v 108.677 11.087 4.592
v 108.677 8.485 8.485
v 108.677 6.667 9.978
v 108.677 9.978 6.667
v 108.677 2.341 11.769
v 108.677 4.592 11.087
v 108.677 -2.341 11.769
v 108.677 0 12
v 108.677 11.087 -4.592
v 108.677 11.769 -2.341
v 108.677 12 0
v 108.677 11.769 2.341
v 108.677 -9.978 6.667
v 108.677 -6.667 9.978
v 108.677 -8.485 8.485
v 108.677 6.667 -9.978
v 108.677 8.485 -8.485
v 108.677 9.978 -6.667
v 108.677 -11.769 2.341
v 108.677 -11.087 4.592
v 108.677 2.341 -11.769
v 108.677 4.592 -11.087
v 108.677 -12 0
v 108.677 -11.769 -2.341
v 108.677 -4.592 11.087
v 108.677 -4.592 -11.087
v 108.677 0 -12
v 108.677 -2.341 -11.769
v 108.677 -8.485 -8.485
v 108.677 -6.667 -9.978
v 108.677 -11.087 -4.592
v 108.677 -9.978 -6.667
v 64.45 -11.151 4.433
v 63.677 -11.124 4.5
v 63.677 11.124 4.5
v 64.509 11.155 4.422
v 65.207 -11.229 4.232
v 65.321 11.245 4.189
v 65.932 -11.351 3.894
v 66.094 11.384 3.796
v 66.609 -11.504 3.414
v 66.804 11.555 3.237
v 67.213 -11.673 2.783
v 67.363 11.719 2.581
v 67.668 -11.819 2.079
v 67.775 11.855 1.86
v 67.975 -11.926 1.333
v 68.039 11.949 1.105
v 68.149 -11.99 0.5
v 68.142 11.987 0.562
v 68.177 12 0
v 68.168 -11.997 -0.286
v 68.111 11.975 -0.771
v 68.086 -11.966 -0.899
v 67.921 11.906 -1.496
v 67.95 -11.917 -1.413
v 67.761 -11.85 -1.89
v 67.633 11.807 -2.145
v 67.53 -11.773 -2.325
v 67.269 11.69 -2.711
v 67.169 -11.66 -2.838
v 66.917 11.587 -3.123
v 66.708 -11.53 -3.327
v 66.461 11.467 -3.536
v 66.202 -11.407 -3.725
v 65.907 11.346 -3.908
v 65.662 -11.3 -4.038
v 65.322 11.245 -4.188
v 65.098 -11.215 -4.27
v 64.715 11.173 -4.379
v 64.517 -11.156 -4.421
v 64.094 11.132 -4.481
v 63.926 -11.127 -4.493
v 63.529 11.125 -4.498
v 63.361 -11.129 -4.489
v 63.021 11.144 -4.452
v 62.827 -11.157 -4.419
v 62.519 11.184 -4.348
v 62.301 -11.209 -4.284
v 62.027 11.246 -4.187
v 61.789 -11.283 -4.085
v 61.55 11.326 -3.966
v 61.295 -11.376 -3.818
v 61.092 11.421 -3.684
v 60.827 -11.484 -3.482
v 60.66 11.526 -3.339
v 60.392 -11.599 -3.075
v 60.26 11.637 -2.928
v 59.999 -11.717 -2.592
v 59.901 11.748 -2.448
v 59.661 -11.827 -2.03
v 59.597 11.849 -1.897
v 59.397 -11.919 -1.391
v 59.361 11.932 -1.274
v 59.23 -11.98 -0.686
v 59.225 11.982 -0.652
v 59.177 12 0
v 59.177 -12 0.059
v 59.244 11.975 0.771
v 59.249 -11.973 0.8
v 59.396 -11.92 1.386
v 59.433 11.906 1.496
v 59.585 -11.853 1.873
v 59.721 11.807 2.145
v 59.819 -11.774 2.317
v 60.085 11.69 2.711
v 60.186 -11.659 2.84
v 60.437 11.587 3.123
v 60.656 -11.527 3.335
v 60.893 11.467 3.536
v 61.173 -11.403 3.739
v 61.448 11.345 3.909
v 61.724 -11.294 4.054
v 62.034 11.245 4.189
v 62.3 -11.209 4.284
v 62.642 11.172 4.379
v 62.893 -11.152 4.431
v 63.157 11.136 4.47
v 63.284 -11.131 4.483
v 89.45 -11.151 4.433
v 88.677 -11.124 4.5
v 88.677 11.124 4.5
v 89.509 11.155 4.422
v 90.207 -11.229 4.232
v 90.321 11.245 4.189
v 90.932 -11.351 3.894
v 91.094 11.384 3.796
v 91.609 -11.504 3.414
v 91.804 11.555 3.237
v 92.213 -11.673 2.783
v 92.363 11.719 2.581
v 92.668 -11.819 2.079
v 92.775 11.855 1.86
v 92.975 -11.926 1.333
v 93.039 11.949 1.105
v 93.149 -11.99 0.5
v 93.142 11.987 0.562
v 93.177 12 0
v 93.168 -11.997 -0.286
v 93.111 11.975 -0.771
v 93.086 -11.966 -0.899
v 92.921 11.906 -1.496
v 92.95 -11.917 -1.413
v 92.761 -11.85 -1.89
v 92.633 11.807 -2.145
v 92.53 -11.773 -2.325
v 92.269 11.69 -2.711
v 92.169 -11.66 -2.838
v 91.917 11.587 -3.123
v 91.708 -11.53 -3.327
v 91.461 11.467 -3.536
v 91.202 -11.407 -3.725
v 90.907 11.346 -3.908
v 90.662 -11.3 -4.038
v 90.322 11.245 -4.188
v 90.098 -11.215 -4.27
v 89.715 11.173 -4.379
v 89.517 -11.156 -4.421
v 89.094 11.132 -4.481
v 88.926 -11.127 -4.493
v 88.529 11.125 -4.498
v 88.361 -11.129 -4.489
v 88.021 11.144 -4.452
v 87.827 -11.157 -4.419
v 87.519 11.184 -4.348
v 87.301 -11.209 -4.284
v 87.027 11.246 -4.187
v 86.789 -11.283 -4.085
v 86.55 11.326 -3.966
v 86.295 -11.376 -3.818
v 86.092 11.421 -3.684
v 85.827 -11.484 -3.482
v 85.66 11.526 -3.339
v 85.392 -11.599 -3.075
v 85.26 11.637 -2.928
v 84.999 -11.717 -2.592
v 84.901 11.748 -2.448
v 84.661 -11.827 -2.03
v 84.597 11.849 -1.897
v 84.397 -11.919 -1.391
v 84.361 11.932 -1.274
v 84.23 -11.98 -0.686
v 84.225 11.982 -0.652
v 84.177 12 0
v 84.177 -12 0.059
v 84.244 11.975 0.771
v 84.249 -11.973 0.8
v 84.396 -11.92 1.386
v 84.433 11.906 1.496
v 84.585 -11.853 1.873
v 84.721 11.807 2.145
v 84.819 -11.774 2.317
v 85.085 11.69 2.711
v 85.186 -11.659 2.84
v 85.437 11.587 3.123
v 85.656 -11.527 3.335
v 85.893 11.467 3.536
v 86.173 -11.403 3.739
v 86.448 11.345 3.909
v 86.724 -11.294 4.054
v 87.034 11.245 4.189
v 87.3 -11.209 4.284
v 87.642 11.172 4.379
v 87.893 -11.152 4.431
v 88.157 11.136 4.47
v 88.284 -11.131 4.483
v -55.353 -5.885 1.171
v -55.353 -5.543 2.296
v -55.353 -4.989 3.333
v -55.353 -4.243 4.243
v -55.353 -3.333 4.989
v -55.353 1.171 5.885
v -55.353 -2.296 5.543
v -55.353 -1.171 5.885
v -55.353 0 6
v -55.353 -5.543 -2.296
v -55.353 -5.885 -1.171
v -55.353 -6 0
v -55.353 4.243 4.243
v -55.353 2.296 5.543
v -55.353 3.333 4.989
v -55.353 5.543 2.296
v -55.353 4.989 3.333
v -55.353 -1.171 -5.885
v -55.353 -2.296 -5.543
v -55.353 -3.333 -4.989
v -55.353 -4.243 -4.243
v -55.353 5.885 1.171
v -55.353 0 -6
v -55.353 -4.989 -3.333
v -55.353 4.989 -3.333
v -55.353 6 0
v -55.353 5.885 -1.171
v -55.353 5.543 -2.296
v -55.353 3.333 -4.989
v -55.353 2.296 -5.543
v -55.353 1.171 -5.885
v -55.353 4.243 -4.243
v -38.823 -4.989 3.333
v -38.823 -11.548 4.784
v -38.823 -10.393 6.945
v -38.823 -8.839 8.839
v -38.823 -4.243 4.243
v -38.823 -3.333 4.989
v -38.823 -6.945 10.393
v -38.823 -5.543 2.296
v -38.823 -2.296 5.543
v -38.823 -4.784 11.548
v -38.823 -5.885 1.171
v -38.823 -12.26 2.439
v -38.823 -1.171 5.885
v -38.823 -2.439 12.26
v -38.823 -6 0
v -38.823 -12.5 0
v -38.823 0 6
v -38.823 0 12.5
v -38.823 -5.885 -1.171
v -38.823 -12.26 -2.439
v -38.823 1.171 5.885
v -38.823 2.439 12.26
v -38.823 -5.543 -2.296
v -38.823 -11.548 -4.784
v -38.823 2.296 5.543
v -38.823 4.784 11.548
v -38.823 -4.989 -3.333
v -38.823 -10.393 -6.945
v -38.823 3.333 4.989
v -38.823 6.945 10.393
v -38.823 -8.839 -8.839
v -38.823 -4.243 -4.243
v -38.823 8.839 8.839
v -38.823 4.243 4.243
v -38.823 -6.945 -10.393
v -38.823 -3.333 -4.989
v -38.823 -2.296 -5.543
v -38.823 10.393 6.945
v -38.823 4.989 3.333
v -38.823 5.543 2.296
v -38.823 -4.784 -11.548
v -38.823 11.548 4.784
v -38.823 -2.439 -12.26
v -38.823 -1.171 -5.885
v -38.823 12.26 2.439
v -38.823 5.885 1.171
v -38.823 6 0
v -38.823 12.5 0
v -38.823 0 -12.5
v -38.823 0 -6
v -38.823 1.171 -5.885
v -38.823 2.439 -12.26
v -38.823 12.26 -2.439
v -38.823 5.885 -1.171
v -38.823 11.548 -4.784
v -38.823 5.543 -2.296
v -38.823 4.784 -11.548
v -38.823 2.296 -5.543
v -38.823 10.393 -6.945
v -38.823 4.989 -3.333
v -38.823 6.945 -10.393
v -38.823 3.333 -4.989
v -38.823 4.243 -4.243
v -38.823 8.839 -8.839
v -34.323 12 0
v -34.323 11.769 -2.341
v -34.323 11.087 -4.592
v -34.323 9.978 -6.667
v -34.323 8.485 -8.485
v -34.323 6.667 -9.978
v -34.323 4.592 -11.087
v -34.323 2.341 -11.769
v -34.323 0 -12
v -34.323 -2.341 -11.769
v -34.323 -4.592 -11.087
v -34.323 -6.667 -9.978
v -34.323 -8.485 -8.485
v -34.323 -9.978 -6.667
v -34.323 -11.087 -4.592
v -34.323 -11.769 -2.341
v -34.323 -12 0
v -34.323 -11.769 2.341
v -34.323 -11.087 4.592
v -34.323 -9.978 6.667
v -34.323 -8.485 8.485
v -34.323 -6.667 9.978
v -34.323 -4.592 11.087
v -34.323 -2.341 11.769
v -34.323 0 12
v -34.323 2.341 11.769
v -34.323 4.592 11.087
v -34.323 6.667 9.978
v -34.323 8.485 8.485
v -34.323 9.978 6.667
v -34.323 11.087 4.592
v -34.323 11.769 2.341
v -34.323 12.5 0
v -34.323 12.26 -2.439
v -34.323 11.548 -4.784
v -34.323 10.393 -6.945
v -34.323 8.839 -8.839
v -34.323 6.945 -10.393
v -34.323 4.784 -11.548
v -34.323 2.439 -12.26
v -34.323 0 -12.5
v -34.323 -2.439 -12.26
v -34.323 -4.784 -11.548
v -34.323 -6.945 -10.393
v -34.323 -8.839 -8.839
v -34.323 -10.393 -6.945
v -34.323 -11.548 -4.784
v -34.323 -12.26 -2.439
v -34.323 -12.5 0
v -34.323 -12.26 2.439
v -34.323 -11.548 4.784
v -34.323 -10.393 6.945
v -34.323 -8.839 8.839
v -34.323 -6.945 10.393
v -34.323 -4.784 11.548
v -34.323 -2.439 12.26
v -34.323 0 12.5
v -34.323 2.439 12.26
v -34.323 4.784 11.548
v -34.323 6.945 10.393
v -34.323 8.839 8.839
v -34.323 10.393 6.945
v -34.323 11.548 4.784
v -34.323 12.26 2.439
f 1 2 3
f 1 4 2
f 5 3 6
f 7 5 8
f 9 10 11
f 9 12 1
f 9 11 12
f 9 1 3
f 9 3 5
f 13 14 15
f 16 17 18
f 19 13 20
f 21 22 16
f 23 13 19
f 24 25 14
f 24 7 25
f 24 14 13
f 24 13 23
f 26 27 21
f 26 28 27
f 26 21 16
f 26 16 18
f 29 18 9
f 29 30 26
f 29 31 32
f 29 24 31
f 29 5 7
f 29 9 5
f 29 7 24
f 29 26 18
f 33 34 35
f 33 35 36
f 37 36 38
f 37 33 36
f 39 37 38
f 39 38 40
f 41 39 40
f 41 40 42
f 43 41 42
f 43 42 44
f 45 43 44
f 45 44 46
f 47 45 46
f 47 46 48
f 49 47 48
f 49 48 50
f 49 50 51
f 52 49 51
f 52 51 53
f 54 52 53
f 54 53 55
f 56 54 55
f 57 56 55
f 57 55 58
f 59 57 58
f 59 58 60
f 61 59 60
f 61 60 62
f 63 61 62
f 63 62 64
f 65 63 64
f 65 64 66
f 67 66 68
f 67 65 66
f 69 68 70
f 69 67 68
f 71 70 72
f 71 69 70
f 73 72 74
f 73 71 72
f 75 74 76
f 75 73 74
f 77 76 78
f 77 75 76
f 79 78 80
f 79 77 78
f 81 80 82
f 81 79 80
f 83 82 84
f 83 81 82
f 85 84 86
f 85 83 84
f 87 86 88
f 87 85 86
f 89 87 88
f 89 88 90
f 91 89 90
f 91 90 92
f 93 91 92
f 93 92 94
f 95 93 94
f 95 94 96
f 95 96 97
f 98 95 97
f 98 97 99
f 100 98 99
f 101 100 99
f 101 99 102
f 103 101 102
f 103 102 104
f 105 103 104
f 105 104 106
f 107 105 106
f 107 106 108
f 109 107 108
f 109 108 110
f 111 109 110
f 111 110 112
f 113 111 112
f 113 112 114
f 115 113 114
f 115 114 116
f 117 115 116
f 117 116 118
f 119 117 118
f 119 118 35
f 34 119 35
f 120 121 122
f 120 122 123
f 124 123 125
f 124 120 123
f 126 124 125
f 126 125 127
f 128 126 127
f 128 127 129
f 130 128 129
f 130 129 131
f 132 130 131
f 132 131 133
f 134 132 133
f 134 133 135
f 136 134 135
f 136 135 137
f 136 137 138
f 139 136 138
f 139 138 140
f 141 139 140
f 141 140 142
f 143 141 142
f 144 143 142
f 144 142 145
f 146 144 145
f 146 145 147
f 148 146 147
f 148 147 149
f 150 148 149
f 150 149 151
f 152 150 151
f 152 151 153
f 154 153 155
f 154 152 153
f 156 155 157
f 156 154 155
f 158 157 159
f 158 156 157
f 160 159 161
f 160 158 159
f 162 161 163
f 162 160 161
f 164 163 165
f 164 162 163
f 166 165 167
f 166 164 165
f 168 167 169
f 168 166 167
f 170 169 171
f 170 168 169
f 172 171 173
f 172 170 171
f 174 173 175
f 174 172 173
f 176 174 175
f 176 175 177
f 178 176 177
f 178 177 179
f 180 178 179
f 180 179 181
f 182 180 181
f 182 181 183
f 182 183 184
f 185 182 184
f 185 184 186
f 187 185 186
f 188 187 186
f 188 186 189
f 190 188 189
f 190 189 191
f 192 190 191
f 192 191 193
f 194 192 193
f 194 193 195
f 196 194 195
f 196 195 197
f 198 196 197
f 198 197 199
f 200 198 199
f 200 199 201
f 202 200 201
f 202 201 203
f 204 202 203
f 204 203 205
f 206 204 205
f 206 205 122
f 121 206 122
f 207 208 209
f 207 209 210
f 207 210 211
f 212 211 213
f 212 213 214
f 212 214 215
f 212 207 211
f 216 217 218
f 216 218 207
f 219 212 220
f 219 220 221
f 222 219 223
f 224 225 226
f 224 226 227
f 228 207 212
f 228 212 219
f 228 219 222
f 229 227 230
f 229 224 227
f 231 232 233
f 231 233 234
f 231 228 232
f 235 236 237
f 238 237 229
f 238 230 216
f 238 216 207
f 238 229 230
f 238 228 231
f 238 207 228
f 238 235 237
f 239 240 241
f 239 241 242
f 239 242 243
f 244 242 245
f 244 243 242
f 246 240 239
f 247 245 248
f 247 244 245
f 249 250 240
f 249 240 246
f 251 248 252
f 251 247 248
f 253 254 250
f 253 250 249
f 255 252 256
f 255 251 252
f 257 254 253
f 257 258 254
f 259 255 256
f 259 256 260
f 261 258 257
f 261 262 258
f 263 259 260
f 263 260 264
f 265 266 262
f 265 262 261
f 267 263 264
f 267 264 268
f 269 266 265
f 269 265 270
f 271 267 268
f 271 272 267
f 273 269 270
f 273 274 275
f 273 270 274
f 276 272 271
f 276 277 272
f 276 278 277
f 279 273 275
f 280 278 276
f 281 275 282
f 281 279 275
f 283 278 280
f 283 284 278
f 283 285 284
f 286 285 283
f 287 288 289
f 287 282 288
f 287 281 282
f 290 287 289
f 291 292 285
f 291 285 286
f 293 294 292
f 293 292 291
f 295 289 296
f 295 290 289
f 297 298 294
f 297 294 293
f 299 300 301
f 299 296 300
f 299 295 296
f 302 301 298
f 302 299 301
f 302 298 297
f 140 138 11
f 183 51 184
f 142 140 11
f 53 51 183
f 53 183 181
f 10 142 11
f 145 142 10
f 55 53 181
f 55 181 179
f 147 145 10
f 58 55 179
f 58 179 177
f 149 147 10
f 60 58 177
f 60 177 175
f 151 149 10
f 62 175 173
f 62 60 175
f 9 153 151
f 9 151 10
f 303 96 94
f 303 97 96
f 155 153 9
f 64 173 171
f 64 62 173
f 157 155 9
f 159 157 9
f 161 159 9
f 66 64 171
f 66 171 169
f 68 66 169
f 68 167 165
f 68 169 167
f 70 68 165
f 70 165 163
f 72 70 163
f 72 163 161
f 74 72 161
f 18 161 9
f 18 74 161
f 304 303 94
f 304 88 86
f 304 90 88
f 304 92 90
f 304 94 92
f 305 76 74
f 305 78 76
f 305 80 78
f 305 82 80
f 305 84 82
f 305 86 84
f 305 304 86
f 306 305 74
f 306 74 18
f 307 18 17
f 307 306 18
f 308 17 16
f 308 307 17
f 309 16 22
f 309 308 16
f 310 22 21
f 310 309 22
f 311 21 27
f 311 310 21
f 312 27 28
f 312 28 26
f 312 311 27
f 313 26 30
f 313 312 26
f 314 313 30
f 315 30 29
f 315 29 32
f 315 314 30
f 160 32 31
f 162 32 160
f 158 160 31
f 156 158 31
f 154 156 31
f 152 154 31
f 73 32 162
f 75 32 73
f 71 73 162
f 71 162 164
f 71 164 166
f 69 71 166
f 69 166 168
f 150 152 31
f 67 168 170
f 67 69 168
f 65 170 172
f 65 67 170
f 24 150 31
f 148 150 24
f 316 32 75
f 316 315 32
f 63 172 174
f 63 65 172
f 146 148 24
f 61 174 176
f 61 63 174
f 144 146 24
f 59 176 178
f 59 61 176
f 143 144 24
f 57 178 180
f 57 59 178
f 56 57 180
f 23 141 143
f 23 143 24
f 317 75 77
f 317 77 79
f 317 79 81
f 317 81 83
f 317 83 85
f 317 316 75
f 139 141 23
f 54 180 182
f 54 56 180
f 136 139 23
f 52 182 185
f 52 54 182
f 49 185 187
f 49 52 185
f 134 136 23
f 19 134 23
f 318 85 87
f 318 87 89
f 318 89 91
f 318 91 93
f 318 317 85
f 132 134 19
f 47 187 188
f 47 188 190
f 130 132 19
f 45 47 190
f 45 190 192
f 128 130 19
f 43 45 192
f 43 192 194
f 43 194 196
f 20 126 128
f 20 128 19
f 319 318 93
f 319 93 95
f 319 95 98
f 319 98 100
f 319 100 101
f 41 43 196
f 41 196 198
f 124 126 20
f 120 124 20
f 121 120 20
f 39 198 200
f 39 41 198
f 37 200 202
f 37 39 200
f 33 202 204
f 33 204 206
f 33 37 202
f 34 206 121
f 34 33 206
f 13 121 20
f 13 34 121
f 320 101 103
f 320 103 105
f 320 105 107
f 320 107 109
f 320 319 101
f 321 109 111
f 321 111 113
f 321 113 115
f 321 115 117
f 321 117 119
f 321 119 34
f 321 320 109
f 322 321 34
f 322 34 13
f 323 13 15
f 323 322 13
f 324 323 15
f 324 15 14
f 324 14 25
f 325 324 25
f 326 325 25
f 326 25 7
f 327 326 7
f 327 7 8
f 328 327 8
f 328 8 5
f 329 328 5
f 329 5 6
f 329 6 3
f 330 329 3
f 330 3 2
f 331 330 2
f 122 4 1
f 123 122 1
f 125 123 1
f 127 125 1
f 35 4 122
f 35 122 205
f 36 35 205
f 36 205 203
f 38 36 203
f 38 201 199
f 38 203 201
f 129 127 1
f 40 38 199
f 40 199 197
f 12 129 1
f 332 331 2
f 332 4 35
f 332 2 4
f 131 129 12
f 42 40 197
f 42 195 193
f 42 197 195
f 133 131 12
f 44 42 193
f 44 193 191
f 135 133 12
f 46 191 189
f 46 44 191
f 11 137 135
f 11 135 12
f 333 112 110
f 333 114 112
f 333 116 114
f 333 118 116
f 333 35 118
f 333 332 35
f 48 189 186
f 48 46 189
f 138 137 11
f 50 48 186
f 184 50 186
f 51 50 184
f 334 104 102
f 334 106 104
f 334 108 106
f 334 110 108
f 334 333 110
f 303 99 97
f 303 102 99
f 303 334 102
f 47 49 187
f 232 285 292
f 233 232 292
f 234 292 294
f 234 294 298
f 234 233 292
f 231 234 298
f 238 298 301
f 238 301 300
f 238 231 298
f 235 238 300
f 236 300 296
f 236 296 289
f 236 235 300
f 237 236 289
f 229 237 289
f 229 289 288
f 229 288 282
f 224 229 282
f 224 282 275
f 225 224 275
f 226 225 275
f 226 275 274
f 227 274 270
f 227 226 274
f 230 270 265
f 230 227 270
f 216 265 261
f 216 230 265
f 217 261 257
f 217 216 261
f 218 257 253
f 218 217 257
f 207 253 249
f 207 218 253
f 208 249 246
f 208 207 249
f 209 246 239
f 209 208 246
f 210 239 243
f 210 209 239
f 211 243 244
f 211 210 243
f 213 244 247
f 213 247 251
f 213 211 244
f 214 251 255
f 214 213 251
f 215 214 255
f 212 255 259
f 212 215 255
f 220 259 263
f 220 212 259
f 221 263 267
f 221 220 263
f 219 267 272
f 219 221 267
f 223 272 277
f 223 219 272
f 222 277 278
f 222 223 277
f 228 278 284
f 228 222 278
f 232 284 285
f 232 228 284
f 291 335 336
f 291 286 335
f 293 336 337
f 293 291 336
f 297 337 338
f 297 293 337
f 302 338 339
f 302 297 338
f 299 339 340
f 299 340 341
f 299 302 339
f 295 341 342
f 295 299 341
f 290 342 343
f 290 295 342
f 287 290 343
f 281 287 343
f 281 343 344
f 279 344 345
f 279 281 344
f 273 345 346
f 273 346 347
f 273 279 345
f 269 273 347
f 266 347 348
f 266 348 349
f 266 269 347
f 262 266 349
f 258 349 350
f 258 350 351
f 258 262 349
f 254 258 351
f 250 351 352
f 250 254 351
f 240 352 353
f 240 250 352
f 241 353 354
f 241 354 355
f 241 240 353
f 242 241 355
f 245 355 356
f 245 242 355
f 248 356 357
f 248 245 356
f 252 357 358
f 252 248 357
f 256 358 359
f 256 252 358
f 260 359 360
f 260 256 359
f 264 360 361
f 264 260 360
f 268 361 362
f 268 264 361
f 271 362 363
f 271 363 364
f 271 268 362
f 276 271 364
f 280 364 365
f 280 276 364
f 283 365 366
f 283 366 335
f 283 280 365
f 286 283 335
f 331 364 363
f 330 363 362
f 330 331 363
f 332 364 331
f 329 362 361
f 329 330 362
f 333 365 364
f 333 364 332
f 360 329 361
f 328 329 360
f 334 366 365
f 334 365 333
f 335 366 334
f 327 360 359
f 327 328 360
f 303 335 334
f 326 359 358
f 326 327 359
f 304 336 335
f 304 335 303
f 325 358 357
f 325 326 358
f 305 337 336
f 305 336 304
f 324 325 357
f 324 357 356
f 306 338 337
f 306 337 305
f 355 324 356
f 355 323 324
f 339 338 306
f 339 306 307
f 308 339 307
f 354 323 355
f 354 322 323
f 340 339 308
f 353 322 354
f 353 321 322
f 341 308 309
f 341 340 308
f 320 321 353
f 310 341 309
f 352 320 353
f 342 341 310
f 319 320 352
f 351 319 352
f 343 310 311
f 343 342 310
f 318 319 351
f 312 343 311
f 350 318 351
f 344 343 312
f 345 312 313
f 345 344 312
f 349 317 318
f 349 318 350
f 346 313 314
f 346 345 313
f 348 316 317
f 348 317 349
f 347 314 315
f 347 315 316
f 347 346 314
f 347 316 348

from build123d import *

# Parameters (mm, degrees)
CUT_EXTRUDE1_DEPTH      = 111.105444252
CUT_EXTRUDE1_DEPTH_BACK = 111.105444252
SKETCH2_R               = 4.5


with BuildPart() as part:
    # Sketch1 → Revolve1 (revolve)
    with BuildSketch(Plane.XY):
        Polygon((108.677085229, 12), (-34.322914771, 12), (-34.322914771, 12.5), (-38.822914771, 12.5), (-38.822914771, 6), (-55.352914771, 6), (-55.352914771, 0), (108.677085229, 0), align=None)
    revolve(axis=Axis((108.677085229, 0, 0), (-1, 0, 0)))

    # Sketch2 → Cut-Extrude1 (cut, two sides: drawn at the far end of the back side and taken through both)
    with BuildSketch(Plane(origin=(0, 0, 0), x_dir=(1, 0, 0), z_dir=(0, 1, 0)).offset(-CUT_EXTRUDE1_DEPTH_BACK)):
        with Locations(Location((88.677085229, 0, 0), (0, 0, 270))):
            Circle(SKETCH2_R)
        with Locations(Location((63.677085229, 0, 0), (0, 0, 270))):
            Circle(SKETCH2_R)
    extrude(amount=CUT_EXTRUDE1_DEPTH + CUT_EXTRUDE1_DEPTH_BACK, mode=Mode.SUBTRACT)


solid = part.part
